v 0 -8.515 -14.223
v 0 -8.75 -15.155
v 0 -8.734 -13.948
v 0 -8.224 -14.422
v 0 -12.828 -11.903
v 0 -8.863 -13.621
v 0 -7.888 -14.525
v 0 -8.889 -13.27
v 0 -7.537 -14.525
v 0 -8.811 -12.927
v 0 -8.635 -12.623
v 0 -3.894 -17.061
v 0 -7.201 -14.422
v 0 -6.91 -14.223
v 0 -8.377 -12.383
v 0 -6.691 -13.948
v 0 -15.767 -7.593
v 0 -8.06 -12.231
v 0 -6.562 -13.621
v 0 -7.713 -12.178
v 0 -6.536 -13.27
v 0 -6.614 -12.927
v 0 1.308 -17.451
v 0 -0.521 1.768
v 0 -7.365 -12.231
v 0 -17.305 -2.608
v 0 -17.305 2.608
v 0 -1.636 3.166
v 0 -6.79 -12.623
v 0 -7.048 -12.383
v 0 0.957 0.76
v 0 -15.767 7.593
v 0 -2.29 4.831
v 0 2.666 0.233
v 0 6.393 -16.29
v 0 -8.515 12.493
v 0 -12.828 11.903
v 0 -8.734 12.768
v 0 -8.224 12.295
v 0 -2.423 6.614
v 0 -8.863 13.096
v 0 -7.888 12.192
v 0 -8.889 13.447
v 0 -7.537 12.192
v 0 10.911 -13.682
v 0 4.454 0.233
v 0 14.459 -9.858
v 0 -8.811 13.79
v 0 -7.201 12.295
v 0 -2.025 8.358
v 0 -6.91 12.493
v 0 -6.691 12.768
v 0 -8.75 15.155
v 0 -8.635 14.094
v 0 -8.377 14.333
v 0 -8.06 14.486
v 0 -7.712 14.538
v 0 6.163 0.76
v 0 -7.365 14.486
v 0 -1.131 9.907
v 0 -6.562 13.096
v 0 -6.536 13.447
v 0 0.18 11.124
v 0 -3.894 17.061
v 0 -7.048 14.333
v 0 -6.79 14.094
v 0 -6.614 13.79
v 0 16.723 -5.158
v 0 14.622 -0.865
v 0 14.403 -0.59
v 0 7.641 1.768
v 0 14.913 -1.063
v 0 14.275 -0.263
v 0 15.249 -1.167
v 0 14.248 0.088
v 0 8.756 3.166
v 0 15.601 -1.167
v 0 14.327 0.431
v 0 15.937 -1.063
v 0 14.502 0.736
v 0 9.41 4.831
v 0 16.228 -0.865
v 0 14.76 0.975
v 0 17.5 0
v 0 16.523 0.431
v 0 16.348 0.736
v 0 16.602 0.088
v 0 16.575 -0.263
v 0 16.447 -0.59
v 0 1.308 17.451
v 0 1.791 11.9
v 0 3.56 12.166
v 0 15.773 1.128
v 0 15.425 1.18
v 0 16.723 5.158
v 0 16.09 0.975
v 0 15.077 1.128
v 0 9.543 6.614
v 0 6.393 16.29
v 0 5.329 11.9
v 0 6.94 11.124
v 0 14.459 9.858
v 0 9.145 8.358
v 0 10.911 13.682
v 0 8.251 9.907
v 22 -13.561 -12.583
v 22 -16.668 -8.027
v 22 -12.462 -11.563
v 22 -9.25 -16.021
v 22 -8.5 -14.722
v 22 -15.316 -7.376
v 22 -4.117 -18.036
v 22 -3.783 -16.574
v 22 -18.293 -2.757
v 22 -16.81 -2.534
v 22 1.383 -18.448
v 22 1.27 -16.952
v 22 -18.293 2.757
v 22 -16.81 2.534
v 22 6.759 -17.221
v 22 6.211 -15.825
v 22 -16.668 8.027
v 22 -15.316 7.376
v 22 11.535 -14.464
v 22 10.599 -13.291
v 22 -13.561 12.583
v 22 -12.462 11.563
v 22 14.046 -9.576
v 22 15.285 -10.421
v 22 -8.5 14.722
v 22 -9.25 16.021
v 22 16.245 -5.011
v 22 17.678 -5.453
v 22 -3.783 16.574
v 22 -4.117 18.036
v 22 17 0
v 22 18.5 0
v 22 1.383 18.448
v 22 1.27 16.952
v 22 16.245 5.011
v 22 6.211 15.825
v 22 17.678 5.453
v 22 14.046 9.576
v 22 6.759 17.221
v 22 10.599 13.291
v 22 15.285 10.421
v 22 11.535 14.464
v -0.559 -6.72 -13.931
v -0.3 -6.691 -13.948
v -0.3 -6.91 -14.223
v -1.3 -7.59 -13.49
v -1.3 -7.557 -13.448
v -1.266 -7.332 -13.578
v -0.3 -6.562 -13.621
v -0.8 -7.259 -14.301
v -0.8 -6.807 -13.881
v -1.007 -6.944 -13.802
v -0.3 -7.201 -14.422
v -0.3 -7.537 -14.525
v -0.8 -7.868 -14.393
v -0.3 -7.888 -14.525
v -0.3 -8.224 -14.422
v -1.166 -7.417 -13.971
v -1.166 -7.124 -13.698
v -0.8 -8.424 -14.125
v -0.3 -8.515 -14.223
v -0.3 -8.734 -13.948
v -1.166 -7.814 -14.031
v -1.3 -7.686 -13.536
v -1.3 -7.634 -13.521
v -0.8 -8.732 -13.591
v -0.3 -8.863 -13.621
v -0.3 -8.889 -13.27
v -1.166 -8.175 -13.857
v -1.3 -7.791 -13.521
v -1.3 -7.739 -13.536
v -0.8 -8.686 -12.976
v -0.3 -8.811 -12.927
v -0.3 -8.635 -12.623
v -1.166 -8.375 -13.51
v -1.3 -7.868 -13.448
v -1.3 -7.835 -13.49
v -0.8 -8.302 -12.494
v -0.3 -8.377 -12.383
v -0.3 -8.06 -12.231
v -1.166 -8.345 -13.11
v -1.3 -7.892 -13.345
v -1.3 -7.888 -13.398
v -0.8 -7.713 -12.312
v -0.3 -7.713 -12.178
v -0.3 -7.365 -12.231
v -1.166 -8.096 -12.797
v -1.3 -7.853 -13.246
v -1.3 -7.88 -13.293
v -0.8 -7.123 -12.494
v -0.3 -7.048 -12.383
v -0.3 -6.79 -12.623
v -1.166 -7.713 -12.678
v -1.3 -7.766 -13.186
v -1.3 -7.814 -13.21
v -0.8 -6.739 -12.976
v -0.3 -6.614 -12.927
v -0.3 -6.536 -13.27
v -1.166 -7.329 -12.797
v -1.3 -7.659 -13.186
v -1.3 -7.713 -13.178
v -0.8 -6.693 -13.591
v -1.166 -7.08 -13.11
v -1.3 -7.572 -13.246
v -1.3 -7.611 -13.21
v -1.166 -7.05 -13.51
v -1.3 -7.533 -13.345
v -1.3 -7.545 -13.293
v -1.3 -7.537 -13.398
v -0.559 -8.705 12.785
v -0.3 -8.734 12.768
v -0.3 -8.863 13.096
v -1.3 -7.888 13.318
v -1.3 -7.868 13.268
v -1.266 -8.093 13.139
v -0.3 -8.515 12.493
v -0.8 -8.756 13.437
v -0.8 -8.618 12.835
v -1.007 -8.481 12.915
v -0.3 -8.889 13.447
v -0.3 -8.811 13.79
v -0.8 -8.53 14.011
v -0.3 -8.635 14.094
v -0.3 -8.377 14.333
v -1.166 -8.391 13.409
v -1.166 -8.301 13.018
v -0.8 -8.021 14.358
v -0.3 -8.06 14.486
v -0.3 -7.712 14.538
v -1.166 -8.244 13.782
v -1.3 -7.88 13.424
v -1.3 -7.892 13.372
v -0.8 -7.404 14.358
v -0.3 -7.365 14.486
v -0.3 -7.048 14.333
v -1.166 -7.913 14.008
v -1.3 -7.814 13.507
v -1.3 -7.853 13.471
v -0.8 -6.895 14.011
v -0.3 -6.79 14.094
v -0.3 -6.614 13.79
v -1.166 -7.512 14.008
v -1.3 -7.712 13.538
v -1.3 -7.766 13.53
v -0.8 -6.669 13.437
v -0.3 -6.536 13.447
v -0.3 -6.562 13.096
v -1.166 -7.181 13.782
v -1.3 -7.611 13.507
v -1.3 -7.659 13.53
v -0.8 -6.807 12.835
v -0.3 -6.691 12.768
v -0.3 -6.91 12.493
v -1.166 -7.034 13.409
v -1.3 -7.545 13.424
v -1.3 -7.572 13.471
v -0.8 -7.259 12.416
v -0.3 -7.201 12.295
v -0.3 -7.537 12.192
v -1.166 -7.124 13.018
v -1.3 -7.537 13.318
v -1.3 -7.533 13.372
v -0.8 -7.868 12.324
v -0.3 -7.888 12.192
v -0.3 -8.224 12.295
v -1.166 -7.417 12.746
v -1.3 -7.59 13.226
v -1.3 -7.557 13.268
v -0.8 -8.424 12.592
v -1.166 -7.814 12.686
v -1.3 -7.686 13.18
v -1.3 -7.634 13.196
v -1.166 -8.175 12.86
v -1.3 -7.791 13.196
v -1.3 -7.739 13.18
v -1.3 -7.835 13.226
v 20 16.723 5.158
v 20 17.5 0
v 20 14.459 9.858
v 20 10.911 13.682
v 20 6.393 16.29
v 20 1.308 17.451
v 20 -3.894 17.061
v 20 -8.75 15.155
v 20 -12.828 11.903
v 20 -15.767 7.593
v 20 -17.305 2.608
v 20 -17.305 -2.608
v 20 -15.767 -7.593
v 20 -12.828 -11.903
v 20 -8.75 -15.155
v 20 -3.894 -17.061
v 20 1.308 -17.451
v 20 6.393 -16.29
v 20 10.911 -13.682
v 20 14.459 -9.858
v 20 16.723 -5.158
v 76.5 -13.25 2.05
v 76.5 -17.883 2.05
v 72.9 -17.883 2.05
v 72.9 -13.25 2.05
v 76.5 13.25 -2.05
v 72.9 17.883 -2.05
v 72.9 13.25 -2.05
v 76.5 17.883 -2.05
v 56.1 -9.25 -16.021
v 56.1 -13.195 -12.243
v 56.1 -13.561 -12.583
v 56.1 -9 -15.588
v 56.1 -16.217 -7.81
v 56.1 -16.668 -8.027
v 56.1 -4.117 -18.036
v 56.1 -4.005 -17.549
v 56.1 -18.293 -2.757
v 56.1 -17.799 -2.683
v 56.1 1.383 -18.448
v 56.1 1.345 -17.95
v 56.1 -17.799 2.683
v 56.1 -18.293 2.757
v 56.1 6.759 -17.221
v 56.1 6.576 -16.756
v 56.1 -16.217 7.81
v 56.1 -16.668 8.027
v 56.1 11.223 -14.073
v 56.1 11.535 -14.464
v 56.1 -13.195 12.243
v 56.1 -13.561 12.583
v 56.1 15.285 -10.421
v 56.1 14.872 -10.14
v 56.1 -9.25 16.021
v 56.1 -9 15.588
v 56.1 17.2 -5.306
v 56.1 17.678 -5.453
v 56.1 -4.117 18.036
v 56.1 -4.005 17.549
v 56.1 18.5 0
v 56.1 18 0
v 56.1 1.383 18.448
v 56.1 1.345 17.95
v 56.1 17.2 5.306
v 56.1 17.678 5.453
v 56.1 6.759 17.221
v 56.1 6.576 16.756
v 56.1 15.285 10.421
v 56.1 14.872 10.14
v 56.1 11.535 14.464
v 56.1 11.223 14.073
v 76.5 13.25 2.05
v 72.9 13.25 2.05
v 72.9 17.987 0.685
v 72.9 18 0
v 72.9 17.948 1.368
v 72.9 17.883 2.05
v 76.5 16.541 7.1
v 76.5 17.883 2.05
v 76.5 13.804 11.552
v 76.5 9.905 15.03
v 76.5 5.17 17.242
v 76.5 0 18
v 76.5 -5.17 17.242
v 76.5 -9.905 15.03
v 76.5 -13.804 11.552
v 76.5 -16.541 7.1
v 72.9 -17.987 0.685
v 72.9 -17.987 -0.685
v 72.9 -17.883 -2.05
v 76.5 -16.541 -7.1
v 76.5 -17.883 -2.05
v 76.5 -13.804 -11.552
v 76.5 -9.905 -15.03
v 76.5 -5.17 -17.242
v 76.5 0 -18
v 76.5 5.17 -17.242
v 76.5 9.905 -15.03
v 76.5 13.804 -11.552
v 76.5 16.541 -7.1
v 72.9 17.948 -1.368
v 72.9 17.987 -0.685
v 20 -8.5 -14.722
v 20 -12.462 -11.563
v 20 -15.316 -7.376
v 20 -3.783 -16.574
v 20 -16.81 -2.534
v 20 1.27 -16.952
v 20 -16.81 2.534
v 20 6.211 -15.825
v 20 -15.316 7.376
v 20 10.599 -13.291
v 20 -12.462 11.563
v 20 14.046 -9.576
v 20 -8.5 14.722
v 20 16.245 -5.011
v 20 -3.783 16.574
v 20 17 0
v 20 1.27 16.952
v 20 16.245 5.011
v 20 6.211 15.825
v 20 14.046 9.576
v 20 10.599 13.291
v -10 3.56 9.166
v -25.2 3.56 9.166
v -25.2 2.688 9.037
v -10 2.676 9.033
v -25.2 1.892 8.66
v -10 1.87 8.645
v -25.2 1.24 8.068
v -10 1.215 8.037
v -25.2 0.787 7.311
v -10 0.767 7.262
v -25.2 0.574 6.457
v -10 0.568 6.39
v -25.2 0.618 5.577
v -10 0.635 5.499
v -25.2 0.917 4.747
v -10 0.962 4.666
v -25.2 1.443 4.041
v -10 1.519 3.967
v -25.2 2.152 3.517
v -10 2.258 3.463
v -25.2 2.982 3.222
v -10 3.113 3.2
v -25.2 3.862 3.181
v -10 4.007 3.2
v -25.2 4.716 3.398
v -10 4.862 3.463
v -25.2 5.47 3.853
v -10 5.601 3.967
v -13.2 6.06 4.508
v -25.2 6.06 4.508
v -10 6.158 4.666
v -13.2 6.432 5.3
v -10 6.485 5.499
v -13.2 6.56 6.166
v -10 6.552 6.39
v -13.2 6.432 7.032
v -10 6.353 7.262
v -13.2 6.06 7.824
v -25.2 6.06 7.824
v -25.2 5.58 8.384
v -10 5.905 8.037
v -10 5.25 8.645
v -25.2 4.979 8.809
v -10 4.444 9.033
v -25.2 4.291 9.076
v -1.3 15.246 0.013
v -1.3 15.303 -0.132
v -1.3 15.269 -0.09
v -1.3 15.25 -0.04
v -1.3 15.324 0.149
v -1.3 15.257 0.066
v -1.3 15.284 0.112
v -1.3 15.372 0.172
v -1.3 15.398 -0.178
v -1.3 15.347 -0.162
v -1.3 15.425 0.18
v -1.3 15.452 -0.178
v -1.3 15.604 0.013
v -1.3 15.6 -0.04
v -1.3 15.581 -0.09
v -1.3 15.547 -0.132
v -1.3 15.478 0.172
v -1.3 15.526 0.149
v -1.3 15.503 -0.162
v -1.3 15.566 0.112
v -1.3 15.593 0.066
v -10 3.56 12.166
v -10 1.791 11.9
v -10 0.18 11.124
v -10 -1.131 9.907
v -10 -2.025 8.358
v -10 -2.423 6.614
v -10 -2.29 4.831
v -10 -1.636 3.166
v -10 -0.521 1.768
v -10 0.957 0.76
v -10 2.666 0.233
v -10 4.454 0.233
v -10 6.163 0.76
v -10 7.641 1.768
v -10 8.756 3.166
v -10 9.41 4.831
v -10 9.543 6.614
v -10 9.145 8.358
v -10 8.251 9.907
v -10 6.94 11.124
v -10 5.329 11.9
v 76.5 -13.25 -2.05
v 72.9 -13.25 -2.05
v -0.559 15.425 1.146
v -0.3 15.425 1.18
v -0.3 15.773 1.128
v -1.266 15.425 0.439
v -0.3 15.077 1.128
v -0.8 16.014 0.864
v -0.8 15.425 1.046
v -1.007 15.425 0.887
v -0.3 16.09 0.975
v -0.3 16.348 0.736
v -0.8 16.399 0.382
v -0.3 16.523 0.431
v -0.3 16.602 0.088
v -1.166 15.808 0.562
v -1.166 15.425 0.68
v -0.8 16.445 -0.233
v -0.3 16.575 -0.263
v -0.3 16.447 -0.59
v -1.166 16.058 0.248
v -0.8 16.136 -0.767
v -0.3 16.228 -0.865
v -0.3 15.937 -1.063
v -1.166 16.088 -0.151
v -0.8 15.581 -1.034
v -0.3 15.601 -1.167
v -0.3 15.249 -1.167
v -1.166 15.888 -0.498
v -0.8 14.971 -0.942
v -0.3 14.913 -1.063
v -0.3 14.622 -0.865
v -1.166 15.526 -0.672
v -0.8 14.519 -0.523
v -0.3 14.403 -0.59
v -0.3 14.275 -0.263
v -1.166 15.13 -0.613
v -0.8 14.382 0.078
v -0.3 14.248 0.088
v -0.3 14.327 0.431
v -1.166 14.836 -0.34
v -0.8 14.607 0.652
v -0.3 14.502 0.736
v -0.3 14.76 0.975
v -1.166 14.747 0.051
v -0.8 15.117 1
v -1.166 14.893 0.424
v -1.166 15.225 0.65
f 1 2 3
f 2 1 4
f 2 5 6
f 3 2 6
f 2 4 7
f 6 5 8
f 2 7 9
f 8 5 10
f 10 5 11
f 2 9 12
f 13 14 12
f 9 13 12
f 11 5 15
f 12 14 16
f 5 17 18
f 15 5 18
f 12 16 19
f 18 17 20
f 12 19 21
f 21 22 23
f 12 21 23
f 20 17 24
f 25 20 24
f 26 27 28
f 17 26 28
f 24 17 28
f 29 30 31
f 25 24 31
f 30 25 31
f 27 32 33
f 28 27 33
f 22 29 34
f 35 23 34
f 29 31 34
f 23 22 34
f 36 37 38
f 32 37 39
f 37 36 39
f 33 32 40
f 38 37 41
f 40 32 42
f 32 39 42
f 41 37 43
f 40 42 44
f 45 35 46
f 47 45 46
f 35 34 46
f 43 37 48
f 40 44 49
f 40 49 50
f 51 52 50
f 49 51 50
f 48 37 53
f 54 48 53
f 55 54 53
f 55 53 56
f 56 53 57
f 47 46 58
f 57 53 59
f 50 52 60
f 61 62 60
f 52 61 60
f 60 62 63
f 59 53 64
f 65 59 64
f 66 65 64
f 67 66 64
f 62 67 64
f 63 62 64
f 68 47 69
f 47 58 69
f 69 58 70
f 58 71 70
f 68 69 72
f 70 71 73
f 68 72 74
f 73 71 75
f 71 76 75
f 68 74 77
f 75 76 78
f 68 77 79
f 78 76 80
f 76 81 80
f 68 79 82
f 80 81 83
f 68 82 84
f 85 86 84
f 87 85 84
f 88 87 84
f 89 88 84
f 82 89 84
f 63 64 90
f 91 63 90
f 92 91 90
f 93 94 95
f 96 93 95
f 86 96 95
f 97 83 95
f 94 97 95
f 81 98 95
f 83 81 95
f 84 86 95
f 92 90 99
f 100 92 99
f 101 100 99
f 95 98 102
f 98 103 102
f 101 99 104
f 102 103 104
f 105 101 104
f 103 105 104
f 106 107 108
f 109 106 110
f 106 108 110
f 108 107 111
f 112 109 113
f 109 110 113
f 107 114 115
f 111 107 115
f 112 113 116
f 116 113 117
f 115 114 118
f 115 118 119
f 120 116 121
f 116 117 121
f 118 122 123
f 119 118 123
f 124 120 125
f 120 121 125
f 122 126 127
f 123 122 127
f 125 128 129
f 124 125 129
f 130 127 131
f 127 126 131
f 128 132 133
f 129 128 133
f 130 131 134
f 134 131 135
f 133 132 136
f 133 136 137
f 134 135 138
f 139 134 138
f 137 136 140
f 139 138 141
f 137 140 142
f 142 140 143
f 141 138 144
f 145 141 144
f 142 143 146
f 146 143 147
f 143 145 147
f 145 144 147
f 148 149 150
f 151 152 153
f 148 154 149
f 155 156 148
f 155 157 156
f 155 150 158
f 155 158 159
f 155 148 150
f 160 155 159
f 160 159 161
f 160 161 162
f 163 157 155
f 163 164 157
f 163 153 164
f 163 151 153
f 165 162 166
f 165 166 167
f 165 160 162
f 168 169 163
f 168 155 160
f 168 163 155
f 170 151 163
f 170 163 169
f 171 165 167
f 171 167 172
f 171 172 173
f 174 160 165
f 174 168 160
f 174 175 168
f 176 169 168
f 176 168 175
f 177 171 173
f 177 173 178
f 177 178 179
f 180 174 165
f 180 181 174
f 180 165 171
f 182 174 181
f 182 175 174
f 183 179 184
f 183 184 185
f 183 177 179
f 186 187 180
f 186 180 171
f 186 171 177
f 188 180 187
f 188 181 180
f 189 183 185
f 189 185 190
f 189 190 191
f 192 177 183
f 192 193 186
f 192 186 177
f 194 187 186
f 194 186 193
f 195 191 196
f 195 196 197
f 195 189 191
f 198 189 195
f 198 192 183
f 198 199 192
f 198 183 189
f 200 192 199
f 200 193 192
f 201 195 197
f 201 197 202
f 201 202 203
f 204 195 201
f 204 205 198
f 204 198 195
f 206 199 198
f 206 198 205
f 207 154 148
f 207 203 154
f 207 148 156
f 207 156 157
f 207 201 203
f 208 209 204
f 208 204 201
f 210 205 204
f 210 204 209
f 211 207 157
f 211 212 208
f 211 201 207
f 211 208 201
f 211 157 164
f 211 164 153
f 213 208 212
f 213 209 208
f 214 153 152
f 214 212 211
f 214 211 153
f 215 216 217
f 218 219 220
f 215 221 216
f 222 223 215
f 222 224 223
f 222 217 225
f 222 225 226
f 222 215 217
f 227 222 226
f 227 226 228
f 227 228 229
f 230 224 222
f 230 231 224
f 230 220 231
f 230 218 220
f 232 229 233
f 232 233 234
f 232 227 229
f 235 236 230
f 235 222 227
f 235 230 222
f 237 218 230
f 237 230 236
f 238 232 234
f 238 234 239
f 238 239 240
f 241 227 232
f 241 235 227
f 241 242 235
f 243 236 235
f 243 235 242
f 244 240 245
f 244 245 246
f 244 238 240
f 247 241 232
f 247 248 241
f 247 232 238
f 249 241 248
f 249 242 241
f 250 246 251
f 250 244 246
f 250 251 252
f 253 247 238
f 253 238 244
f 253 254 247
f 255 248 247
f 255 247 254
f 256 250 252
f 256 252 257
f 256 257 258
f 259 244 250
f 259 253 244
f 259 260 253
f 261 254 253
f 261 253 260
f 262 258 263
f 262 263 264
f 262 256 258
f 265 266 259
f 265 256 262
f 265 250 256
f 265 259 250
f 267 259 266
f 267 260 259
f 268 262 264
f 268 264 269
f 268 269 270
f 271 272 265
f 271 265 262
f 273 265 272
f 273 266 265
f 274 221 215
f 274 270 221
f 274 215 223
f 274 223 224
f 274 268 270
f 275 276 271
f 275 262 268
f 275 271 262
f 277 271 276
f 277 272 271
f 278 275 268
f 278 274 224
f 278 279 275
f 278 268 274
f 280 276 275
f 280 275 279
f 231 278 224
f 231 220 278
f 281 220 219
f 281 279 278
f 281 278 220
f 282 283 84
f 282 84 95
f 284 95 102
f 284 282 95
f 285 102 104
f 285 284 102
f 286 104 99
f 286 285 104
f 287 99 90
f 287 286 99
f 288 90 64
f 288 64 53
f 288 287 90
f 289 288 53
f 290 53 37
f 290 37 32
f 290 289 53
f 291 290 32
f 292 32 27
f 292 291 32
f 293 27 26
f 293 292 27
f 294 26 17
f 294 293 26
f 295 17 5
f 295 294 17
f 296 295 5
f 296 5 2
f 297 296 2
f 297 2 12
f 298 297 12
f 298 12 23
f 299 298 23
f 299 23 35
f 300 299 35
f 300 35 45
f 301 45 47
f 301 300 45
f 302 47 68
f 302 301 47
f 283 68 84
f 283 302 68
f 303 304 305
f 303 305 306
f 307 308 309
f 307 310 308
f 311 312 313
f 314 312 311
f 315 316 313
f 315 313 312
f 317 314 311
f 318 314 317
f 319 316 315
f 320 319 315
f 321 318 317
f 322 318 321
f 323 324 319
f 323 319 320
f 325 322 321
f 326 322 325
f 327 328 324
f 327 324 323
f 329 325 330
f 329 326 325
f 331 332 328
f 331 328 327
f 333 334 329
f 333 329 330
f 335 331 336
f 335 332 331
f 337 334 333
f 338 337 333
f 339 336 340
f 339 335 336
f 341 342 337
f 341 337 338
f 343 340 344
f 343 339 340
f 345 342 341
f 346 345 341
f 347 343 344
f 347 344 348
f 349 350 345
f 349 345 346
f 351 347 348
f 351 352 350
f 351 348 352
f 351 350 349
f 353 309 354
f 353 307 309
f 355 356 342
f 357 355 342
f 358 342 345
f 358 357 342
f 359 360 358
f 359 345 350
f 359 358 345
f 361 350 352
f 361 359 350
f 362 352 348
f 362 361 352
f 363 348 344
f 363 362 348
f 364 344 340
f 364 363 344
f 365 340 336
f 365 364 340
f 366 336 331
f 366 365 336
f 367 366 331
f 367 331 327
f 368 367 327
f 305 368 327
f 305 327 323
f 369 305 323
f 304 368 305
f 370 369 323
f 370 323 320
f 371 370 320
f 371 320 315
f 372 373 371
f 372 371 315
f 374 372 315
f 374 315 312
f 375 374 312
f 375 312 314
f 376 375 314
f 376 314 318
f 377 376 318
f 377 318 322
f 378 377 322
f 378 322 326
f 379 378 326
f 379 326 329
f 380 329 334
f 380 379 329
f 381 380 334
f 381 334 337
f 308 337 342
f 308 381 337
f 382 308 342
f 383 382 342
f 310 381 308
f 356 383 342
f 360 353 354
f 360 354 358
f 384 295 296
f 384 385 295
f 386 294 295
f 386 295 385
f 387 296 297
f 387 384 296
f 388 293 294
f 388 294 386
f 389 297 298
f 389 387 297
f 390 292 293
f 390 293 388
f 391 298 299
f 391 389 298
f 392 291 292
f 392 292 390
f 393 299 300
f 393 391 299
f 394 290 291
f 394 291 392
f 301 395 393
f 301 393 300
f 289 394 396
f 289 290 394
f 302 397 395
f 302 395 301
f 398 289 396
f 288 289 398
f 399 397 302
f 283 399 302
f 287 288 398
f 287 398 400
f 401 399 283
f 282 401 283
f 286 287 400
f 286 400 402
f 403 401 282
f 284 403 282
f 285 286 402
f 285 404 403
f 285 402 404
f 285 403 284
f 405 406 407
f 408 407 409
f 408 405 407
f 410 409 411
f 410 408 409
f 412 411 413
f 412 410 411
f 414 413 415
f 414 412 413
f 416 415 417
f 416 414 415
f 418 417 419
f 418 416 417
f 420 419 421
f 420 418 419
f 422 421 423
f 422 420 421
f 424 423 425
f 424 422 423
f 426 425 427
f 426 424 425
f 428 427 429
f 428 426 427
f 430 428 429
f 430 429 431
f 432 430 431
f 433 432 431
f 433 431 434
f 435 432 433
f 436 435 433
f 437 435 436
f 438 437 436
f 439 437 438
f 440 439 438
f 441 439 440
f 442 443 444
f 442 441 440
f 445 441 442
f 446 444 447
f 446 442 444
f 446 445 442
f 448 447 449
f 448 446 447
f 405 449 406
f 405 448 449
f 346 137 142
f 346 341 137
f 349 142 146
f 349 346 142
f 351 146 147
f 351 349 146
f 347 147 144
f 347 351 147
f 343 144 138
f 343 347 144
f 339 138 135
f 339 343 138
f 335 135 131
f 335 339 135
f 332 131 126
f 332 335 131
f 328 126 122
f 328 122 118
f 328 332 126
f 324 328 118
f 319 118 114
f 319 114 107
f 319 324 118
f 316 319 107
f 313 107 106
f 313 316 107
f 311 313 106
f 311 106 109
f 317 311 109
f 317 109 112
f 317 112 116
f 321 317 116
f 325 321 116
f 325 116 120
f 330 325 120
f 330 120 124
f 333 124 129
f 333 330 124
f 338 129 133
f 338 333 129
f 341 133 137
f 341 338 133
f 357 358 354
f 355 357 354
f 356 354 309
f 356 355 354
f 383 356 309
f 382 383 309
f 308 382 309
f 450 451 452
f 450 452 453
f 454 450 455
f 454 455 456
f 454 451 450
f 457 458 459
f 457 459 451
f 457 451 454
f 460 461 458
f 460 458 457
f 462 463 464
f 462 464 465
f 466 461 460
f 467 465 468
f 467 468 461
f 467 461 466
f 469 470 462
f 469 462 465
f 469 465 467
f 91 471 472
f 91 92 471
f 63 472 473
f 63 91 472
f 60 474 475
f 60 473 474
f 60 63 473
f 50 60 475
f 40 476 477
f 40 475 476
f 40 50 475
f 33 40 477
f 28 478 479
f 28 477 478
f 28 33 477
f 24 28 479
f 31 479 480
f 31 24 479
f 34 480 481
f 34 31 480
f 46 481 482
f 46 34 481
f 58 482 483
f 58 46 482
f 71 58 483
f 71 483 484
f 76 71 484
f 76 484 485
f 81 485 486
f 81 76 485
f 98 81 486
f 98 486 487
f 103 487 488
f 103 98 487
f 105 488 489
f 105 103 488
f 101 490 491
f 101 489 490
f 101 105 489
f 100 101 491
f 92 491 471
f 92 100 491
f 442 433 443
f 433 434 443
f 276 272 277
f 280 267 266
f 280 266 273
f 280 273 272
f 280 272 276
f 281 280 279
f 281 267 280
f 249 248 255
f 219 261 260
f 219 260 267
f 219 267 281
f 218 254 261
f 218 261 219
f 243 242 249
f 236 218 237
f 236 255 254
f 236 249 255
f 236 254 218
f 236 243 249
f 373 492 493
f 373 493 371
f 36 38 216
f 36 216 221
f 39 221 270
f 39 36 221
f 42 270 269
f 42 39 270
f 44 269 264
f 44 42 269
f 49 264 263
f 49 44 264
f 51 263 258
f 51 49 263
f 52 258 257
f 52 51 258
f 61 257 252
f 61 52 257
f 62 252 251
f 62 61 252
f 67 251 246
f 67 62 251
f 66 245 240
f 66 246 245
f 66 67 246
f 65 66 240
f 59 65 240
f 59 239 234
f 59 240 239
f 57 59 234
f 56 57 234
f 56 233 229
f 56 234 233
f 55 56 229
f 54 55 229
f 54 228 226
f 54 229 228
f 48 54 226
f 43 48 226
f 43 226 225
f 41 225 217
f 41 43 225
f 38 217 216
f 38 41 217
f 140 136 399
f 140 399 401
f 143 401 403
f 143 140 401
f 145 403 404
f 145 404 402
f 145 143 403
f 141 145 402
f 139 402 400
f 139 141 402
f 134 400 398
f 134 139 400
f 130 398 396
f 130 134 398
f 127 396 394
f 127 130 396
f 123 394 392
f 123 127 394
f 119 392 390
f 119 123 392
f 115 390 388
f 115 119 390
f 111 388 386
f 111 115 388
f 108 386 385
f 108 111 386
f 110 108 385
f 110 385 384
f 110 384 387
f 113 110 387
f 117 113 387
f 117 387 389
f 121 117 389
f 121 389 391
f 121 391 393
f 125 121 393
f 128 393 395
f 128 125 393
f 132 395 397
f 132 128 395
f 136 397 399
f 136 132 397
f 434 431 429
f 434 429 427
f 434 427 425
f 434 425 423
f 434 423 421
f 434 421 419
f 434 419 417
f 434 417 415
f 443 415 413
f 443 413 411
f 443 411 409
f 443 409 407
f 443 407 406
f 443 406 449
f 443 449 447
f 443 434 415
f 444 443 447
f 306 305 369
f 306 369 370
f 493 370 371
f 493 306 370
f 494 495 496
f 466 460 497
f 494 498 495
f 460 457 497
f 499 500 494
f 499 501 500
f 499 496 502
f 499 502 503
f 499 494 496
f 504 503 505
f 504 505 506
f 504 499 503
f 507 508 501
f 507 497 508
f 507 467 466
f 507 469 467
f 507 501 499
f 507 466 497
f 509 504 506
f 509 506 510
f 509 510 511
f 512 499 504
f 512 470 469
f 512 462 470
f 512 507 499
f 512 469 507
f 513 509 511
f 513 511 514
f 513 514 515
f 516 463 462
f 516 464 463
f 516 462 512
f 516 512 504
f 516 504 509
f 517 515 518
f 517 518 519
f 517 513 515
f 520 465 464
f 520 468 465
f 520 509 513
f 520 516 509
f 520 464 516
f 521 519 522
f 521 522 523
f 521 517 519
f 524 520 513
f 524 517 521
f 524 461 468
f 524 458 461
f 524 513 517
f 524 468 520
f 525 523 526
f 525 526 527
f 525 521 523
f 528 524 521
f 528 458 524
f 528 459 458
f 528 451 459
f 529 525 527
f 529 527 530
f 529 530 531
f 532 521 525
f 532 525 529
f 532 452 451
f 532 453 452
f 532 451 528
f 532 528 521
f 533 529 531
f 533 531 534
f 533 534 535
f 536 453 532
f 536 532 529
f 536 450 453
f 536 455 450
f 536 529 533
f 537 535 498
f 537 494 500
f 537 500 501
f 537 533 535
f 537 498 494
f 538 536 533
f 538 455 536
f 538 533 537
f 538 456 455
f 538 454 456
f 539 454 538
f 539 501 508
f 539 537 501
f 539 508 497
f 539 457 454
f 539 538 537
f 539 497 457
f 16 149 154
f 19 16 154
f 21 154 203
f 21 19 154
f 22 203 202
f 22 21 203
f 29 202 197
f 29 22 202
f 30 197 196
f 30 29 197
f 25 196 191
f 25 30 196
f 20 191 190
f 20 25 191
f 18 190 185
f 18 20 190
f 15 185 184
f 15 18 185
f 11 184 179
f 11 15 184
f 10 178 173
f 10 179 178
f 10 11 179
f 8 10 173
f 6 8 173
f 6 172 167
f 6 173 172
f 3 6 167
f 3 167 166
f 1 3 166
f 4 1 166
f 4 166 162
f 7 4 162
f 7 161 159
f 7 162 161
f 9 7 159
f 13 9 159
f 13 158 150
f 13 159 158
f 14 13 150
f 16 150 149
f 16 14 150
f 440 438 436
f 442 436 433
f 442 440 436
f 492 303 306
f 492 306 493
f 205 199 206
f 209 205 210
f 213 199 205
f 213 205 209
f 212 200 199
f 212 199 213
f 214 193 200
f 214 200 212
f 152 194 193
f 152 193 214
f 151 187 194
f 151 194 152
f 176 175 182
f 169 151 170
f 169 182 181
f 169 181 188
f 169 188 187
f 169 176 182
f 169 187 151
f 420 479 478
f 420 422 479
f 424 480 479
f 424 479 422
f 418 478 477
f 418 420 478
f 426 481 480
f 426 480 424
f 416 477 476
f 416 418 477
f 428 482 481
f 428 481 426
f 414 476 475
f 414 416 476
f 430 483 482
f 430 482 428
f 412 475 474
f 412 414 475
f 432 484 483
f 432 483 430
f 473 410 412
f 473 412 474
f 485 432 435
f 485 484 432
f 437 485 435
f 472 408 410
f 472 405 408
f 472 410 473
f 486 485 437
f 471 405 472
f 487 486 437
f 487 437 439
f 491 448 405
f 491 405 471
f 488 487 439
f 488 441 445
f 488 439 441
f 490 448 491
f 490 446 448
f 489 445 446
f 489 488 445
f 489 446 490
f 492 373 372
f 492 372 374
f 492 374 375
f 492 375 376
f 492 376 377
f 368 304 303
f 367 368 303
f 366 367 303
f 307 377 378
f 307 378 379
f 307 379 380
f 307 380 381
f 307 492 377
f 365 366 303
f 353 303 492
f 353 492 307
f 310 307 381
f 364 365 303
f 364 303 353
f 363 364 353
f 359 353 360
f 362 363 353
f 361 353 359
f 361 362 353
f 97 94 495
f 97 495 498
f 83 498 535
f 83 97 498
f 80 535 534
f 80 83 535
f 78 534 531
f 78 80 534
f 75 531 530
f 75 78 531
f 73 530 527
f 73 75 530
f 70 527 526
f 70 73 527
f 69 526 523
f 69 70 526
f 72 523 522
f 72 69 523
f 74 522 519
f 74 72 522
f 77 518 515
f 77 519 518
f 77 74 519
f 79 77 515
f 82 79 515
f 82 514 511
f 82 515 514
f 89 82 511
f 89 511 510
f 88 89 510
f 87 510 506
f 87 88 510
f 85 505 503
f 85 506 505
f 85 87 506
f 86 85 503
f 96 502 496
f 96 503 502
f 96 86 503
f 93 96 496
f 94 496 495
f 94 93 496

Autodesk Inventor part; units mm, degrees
ref_plane "YZ Plane" through (0, 0, 0) normal (1, 0, 0) x (0, 1, 0)
ref_plane "XZ Plane" through (0, 0, 0) normal (0, 1, 0) x (-1, 0, 0)
ref_plane "XY Plane" through (0, 0, 0) normal (0, 0, 1) x (1, 0, 0)
sketch "Sketch1" plane through (0, 0, 0) normal (0, 0, 1) x (1, 0, 0)
  line L0 (0, 0) -> (76.5, 0)
  line L1 (0, 0) -> (0, 17.5)
  line L2 (0, 17.5) -> (20, 17.5)
  line L3 (20, 17.5) -> (20, 17)
  line L4 (20, 17) -> (22, 17)
  line L5 (22, 17) -> (22, 18.5)
  line L6 (22, 18.5) -> (56.1, 18.5)
  line L7 (56.1, 18.5) -> (56.1, 18)
  line L8 (56.1, 18) -> (76.5, 18)
  line L9 (76.5, 18) -> (76.5, 0)
  dimension "d0" = 76.5
  dimension "d1" = 34
  dimension "d2" = 35
  dimension "d3" = 37
  dimension "d4" = 36
  dimension "d5" = 20
  dimension "d6" = 2
  dimension "d7" = 34.1
revolve "Revolution1" add sketch "Sketch1" angle 360 about axis through (0, 0, 0) along (1, 0, 0)
sketch "Sketch2" plane through (76.5, 0, 0) normal (1, 0, 0) x (0, 0, -1)
  line L0 (-2.05, 20.1398) -> (2.05, 20.1398)
  line L1 (2.05, 20.1398) -> (2.05, 13.25)
  line L2 (2.05, 13.25) -> (-2.05, 13.25)
  line L3 (-2.05, 13.25) -> (-2.05, 20.1398)
  line L4 (-2.05, -13.25) -> (2.05, -13.25)
  line L5 (2.05, -13.25) -> (2.05, -20.9754)
  line L6 (2.05, -20.9754) -> (-2.05, -20.9754)
  line L7 (-2.05, -20.9754) -> (-2.05, -13.25)
  point P0 (0, 0)
  dimension "d9" = 4.1
  dimension "d10" = 4.1
  dimension "d11" = 2.05
  dimension "d12" = 2.05
  dimension "d13" = 26.5
  dimension "d14" = 13.25
extrude "Extrusion1" cut sketch "Sketch2" against normal blind 3.6
sketch "Sketch3" plane through (0, 0, 0) normal (-1, 0, 0) x (0, 0, 1)
  circle A0 centre (0, 0) radius 15.425 construction
  circle A1 centre (0, 15.425) radius 1.18
  dimension "d17" = 30.85
  dimension "d18" = 2.36
extrude "Extrusion2" add sketch "Sketch3" along normal blind 1.3
fillet "Fillet1" radius 1 1 edges at (-1.3, 15.425, -1.18)
pattern_circular "Circular Pattern1" count 3 over 360 about axis through (39.05, 0, 0) along (1, 0, 0) of "Extrusion2", "Fillet1"
sketch "Sketch4" plane through (0, 0, 0) normal (-1, 0, 0) x (0, 0, 1)
  circle A0 centre (0, 15.425) radius 1.18 construction
  circle A1 centre (13.3584, -7.7125) radius 1.18 construction
  line L0 (0, 15.425) -> (13.3584, -7.7125) construction
  line L1 (6.6792, 3.8563) -> (24.6731, 14.245) construction
  circle A2 centre (6.1661, 3.56) radius 6
  point P0 (0, 0)
  dimension "d25" = 7.12
  dimension "d26" = 12
extrude "Extrusion3" add sketch "Sketch4" along normal blind 10
sketch "Sketch5" plane through (-10, 3.56, 6.1661) normal (-1, 0, 0) x (0, 0, 1)
  circle A0 centre (0, 0) radius 6 construction
  circle A1 centre (0, 0) radius 3
  point P0 (-6.1661, -3.56)
  dimension "d29" = 6
extrude "Extrusion4" add sketch "Sketch5" along normal blind 15.2
sketch "Sketch6" plane through (-25.2, 3.56, 6.1661) normal (-1, 0, 0) x (0, 0, 1)
  circle A0 centre (0, 0) radius 3 construction
  arc A1 (1.6583, 2.5) -> (-1.6583, 2.5) centre (0, 0) ccw
  line L0 (-1.6583, 2.5) -> (1.6583, 2.5)
  point P0 (-6.1661, -3.56)
  dimension "d35" = 2.5
extrude "Extrusion5" cut sketch "Sketch6" against normal blind 12
equation "\"d11\" = 0.5 * d10"
equation "\"d12\" = 0.5 * d9"
equation "\"d14\" = 0.5 * d13"
properties part number "Moteur"
